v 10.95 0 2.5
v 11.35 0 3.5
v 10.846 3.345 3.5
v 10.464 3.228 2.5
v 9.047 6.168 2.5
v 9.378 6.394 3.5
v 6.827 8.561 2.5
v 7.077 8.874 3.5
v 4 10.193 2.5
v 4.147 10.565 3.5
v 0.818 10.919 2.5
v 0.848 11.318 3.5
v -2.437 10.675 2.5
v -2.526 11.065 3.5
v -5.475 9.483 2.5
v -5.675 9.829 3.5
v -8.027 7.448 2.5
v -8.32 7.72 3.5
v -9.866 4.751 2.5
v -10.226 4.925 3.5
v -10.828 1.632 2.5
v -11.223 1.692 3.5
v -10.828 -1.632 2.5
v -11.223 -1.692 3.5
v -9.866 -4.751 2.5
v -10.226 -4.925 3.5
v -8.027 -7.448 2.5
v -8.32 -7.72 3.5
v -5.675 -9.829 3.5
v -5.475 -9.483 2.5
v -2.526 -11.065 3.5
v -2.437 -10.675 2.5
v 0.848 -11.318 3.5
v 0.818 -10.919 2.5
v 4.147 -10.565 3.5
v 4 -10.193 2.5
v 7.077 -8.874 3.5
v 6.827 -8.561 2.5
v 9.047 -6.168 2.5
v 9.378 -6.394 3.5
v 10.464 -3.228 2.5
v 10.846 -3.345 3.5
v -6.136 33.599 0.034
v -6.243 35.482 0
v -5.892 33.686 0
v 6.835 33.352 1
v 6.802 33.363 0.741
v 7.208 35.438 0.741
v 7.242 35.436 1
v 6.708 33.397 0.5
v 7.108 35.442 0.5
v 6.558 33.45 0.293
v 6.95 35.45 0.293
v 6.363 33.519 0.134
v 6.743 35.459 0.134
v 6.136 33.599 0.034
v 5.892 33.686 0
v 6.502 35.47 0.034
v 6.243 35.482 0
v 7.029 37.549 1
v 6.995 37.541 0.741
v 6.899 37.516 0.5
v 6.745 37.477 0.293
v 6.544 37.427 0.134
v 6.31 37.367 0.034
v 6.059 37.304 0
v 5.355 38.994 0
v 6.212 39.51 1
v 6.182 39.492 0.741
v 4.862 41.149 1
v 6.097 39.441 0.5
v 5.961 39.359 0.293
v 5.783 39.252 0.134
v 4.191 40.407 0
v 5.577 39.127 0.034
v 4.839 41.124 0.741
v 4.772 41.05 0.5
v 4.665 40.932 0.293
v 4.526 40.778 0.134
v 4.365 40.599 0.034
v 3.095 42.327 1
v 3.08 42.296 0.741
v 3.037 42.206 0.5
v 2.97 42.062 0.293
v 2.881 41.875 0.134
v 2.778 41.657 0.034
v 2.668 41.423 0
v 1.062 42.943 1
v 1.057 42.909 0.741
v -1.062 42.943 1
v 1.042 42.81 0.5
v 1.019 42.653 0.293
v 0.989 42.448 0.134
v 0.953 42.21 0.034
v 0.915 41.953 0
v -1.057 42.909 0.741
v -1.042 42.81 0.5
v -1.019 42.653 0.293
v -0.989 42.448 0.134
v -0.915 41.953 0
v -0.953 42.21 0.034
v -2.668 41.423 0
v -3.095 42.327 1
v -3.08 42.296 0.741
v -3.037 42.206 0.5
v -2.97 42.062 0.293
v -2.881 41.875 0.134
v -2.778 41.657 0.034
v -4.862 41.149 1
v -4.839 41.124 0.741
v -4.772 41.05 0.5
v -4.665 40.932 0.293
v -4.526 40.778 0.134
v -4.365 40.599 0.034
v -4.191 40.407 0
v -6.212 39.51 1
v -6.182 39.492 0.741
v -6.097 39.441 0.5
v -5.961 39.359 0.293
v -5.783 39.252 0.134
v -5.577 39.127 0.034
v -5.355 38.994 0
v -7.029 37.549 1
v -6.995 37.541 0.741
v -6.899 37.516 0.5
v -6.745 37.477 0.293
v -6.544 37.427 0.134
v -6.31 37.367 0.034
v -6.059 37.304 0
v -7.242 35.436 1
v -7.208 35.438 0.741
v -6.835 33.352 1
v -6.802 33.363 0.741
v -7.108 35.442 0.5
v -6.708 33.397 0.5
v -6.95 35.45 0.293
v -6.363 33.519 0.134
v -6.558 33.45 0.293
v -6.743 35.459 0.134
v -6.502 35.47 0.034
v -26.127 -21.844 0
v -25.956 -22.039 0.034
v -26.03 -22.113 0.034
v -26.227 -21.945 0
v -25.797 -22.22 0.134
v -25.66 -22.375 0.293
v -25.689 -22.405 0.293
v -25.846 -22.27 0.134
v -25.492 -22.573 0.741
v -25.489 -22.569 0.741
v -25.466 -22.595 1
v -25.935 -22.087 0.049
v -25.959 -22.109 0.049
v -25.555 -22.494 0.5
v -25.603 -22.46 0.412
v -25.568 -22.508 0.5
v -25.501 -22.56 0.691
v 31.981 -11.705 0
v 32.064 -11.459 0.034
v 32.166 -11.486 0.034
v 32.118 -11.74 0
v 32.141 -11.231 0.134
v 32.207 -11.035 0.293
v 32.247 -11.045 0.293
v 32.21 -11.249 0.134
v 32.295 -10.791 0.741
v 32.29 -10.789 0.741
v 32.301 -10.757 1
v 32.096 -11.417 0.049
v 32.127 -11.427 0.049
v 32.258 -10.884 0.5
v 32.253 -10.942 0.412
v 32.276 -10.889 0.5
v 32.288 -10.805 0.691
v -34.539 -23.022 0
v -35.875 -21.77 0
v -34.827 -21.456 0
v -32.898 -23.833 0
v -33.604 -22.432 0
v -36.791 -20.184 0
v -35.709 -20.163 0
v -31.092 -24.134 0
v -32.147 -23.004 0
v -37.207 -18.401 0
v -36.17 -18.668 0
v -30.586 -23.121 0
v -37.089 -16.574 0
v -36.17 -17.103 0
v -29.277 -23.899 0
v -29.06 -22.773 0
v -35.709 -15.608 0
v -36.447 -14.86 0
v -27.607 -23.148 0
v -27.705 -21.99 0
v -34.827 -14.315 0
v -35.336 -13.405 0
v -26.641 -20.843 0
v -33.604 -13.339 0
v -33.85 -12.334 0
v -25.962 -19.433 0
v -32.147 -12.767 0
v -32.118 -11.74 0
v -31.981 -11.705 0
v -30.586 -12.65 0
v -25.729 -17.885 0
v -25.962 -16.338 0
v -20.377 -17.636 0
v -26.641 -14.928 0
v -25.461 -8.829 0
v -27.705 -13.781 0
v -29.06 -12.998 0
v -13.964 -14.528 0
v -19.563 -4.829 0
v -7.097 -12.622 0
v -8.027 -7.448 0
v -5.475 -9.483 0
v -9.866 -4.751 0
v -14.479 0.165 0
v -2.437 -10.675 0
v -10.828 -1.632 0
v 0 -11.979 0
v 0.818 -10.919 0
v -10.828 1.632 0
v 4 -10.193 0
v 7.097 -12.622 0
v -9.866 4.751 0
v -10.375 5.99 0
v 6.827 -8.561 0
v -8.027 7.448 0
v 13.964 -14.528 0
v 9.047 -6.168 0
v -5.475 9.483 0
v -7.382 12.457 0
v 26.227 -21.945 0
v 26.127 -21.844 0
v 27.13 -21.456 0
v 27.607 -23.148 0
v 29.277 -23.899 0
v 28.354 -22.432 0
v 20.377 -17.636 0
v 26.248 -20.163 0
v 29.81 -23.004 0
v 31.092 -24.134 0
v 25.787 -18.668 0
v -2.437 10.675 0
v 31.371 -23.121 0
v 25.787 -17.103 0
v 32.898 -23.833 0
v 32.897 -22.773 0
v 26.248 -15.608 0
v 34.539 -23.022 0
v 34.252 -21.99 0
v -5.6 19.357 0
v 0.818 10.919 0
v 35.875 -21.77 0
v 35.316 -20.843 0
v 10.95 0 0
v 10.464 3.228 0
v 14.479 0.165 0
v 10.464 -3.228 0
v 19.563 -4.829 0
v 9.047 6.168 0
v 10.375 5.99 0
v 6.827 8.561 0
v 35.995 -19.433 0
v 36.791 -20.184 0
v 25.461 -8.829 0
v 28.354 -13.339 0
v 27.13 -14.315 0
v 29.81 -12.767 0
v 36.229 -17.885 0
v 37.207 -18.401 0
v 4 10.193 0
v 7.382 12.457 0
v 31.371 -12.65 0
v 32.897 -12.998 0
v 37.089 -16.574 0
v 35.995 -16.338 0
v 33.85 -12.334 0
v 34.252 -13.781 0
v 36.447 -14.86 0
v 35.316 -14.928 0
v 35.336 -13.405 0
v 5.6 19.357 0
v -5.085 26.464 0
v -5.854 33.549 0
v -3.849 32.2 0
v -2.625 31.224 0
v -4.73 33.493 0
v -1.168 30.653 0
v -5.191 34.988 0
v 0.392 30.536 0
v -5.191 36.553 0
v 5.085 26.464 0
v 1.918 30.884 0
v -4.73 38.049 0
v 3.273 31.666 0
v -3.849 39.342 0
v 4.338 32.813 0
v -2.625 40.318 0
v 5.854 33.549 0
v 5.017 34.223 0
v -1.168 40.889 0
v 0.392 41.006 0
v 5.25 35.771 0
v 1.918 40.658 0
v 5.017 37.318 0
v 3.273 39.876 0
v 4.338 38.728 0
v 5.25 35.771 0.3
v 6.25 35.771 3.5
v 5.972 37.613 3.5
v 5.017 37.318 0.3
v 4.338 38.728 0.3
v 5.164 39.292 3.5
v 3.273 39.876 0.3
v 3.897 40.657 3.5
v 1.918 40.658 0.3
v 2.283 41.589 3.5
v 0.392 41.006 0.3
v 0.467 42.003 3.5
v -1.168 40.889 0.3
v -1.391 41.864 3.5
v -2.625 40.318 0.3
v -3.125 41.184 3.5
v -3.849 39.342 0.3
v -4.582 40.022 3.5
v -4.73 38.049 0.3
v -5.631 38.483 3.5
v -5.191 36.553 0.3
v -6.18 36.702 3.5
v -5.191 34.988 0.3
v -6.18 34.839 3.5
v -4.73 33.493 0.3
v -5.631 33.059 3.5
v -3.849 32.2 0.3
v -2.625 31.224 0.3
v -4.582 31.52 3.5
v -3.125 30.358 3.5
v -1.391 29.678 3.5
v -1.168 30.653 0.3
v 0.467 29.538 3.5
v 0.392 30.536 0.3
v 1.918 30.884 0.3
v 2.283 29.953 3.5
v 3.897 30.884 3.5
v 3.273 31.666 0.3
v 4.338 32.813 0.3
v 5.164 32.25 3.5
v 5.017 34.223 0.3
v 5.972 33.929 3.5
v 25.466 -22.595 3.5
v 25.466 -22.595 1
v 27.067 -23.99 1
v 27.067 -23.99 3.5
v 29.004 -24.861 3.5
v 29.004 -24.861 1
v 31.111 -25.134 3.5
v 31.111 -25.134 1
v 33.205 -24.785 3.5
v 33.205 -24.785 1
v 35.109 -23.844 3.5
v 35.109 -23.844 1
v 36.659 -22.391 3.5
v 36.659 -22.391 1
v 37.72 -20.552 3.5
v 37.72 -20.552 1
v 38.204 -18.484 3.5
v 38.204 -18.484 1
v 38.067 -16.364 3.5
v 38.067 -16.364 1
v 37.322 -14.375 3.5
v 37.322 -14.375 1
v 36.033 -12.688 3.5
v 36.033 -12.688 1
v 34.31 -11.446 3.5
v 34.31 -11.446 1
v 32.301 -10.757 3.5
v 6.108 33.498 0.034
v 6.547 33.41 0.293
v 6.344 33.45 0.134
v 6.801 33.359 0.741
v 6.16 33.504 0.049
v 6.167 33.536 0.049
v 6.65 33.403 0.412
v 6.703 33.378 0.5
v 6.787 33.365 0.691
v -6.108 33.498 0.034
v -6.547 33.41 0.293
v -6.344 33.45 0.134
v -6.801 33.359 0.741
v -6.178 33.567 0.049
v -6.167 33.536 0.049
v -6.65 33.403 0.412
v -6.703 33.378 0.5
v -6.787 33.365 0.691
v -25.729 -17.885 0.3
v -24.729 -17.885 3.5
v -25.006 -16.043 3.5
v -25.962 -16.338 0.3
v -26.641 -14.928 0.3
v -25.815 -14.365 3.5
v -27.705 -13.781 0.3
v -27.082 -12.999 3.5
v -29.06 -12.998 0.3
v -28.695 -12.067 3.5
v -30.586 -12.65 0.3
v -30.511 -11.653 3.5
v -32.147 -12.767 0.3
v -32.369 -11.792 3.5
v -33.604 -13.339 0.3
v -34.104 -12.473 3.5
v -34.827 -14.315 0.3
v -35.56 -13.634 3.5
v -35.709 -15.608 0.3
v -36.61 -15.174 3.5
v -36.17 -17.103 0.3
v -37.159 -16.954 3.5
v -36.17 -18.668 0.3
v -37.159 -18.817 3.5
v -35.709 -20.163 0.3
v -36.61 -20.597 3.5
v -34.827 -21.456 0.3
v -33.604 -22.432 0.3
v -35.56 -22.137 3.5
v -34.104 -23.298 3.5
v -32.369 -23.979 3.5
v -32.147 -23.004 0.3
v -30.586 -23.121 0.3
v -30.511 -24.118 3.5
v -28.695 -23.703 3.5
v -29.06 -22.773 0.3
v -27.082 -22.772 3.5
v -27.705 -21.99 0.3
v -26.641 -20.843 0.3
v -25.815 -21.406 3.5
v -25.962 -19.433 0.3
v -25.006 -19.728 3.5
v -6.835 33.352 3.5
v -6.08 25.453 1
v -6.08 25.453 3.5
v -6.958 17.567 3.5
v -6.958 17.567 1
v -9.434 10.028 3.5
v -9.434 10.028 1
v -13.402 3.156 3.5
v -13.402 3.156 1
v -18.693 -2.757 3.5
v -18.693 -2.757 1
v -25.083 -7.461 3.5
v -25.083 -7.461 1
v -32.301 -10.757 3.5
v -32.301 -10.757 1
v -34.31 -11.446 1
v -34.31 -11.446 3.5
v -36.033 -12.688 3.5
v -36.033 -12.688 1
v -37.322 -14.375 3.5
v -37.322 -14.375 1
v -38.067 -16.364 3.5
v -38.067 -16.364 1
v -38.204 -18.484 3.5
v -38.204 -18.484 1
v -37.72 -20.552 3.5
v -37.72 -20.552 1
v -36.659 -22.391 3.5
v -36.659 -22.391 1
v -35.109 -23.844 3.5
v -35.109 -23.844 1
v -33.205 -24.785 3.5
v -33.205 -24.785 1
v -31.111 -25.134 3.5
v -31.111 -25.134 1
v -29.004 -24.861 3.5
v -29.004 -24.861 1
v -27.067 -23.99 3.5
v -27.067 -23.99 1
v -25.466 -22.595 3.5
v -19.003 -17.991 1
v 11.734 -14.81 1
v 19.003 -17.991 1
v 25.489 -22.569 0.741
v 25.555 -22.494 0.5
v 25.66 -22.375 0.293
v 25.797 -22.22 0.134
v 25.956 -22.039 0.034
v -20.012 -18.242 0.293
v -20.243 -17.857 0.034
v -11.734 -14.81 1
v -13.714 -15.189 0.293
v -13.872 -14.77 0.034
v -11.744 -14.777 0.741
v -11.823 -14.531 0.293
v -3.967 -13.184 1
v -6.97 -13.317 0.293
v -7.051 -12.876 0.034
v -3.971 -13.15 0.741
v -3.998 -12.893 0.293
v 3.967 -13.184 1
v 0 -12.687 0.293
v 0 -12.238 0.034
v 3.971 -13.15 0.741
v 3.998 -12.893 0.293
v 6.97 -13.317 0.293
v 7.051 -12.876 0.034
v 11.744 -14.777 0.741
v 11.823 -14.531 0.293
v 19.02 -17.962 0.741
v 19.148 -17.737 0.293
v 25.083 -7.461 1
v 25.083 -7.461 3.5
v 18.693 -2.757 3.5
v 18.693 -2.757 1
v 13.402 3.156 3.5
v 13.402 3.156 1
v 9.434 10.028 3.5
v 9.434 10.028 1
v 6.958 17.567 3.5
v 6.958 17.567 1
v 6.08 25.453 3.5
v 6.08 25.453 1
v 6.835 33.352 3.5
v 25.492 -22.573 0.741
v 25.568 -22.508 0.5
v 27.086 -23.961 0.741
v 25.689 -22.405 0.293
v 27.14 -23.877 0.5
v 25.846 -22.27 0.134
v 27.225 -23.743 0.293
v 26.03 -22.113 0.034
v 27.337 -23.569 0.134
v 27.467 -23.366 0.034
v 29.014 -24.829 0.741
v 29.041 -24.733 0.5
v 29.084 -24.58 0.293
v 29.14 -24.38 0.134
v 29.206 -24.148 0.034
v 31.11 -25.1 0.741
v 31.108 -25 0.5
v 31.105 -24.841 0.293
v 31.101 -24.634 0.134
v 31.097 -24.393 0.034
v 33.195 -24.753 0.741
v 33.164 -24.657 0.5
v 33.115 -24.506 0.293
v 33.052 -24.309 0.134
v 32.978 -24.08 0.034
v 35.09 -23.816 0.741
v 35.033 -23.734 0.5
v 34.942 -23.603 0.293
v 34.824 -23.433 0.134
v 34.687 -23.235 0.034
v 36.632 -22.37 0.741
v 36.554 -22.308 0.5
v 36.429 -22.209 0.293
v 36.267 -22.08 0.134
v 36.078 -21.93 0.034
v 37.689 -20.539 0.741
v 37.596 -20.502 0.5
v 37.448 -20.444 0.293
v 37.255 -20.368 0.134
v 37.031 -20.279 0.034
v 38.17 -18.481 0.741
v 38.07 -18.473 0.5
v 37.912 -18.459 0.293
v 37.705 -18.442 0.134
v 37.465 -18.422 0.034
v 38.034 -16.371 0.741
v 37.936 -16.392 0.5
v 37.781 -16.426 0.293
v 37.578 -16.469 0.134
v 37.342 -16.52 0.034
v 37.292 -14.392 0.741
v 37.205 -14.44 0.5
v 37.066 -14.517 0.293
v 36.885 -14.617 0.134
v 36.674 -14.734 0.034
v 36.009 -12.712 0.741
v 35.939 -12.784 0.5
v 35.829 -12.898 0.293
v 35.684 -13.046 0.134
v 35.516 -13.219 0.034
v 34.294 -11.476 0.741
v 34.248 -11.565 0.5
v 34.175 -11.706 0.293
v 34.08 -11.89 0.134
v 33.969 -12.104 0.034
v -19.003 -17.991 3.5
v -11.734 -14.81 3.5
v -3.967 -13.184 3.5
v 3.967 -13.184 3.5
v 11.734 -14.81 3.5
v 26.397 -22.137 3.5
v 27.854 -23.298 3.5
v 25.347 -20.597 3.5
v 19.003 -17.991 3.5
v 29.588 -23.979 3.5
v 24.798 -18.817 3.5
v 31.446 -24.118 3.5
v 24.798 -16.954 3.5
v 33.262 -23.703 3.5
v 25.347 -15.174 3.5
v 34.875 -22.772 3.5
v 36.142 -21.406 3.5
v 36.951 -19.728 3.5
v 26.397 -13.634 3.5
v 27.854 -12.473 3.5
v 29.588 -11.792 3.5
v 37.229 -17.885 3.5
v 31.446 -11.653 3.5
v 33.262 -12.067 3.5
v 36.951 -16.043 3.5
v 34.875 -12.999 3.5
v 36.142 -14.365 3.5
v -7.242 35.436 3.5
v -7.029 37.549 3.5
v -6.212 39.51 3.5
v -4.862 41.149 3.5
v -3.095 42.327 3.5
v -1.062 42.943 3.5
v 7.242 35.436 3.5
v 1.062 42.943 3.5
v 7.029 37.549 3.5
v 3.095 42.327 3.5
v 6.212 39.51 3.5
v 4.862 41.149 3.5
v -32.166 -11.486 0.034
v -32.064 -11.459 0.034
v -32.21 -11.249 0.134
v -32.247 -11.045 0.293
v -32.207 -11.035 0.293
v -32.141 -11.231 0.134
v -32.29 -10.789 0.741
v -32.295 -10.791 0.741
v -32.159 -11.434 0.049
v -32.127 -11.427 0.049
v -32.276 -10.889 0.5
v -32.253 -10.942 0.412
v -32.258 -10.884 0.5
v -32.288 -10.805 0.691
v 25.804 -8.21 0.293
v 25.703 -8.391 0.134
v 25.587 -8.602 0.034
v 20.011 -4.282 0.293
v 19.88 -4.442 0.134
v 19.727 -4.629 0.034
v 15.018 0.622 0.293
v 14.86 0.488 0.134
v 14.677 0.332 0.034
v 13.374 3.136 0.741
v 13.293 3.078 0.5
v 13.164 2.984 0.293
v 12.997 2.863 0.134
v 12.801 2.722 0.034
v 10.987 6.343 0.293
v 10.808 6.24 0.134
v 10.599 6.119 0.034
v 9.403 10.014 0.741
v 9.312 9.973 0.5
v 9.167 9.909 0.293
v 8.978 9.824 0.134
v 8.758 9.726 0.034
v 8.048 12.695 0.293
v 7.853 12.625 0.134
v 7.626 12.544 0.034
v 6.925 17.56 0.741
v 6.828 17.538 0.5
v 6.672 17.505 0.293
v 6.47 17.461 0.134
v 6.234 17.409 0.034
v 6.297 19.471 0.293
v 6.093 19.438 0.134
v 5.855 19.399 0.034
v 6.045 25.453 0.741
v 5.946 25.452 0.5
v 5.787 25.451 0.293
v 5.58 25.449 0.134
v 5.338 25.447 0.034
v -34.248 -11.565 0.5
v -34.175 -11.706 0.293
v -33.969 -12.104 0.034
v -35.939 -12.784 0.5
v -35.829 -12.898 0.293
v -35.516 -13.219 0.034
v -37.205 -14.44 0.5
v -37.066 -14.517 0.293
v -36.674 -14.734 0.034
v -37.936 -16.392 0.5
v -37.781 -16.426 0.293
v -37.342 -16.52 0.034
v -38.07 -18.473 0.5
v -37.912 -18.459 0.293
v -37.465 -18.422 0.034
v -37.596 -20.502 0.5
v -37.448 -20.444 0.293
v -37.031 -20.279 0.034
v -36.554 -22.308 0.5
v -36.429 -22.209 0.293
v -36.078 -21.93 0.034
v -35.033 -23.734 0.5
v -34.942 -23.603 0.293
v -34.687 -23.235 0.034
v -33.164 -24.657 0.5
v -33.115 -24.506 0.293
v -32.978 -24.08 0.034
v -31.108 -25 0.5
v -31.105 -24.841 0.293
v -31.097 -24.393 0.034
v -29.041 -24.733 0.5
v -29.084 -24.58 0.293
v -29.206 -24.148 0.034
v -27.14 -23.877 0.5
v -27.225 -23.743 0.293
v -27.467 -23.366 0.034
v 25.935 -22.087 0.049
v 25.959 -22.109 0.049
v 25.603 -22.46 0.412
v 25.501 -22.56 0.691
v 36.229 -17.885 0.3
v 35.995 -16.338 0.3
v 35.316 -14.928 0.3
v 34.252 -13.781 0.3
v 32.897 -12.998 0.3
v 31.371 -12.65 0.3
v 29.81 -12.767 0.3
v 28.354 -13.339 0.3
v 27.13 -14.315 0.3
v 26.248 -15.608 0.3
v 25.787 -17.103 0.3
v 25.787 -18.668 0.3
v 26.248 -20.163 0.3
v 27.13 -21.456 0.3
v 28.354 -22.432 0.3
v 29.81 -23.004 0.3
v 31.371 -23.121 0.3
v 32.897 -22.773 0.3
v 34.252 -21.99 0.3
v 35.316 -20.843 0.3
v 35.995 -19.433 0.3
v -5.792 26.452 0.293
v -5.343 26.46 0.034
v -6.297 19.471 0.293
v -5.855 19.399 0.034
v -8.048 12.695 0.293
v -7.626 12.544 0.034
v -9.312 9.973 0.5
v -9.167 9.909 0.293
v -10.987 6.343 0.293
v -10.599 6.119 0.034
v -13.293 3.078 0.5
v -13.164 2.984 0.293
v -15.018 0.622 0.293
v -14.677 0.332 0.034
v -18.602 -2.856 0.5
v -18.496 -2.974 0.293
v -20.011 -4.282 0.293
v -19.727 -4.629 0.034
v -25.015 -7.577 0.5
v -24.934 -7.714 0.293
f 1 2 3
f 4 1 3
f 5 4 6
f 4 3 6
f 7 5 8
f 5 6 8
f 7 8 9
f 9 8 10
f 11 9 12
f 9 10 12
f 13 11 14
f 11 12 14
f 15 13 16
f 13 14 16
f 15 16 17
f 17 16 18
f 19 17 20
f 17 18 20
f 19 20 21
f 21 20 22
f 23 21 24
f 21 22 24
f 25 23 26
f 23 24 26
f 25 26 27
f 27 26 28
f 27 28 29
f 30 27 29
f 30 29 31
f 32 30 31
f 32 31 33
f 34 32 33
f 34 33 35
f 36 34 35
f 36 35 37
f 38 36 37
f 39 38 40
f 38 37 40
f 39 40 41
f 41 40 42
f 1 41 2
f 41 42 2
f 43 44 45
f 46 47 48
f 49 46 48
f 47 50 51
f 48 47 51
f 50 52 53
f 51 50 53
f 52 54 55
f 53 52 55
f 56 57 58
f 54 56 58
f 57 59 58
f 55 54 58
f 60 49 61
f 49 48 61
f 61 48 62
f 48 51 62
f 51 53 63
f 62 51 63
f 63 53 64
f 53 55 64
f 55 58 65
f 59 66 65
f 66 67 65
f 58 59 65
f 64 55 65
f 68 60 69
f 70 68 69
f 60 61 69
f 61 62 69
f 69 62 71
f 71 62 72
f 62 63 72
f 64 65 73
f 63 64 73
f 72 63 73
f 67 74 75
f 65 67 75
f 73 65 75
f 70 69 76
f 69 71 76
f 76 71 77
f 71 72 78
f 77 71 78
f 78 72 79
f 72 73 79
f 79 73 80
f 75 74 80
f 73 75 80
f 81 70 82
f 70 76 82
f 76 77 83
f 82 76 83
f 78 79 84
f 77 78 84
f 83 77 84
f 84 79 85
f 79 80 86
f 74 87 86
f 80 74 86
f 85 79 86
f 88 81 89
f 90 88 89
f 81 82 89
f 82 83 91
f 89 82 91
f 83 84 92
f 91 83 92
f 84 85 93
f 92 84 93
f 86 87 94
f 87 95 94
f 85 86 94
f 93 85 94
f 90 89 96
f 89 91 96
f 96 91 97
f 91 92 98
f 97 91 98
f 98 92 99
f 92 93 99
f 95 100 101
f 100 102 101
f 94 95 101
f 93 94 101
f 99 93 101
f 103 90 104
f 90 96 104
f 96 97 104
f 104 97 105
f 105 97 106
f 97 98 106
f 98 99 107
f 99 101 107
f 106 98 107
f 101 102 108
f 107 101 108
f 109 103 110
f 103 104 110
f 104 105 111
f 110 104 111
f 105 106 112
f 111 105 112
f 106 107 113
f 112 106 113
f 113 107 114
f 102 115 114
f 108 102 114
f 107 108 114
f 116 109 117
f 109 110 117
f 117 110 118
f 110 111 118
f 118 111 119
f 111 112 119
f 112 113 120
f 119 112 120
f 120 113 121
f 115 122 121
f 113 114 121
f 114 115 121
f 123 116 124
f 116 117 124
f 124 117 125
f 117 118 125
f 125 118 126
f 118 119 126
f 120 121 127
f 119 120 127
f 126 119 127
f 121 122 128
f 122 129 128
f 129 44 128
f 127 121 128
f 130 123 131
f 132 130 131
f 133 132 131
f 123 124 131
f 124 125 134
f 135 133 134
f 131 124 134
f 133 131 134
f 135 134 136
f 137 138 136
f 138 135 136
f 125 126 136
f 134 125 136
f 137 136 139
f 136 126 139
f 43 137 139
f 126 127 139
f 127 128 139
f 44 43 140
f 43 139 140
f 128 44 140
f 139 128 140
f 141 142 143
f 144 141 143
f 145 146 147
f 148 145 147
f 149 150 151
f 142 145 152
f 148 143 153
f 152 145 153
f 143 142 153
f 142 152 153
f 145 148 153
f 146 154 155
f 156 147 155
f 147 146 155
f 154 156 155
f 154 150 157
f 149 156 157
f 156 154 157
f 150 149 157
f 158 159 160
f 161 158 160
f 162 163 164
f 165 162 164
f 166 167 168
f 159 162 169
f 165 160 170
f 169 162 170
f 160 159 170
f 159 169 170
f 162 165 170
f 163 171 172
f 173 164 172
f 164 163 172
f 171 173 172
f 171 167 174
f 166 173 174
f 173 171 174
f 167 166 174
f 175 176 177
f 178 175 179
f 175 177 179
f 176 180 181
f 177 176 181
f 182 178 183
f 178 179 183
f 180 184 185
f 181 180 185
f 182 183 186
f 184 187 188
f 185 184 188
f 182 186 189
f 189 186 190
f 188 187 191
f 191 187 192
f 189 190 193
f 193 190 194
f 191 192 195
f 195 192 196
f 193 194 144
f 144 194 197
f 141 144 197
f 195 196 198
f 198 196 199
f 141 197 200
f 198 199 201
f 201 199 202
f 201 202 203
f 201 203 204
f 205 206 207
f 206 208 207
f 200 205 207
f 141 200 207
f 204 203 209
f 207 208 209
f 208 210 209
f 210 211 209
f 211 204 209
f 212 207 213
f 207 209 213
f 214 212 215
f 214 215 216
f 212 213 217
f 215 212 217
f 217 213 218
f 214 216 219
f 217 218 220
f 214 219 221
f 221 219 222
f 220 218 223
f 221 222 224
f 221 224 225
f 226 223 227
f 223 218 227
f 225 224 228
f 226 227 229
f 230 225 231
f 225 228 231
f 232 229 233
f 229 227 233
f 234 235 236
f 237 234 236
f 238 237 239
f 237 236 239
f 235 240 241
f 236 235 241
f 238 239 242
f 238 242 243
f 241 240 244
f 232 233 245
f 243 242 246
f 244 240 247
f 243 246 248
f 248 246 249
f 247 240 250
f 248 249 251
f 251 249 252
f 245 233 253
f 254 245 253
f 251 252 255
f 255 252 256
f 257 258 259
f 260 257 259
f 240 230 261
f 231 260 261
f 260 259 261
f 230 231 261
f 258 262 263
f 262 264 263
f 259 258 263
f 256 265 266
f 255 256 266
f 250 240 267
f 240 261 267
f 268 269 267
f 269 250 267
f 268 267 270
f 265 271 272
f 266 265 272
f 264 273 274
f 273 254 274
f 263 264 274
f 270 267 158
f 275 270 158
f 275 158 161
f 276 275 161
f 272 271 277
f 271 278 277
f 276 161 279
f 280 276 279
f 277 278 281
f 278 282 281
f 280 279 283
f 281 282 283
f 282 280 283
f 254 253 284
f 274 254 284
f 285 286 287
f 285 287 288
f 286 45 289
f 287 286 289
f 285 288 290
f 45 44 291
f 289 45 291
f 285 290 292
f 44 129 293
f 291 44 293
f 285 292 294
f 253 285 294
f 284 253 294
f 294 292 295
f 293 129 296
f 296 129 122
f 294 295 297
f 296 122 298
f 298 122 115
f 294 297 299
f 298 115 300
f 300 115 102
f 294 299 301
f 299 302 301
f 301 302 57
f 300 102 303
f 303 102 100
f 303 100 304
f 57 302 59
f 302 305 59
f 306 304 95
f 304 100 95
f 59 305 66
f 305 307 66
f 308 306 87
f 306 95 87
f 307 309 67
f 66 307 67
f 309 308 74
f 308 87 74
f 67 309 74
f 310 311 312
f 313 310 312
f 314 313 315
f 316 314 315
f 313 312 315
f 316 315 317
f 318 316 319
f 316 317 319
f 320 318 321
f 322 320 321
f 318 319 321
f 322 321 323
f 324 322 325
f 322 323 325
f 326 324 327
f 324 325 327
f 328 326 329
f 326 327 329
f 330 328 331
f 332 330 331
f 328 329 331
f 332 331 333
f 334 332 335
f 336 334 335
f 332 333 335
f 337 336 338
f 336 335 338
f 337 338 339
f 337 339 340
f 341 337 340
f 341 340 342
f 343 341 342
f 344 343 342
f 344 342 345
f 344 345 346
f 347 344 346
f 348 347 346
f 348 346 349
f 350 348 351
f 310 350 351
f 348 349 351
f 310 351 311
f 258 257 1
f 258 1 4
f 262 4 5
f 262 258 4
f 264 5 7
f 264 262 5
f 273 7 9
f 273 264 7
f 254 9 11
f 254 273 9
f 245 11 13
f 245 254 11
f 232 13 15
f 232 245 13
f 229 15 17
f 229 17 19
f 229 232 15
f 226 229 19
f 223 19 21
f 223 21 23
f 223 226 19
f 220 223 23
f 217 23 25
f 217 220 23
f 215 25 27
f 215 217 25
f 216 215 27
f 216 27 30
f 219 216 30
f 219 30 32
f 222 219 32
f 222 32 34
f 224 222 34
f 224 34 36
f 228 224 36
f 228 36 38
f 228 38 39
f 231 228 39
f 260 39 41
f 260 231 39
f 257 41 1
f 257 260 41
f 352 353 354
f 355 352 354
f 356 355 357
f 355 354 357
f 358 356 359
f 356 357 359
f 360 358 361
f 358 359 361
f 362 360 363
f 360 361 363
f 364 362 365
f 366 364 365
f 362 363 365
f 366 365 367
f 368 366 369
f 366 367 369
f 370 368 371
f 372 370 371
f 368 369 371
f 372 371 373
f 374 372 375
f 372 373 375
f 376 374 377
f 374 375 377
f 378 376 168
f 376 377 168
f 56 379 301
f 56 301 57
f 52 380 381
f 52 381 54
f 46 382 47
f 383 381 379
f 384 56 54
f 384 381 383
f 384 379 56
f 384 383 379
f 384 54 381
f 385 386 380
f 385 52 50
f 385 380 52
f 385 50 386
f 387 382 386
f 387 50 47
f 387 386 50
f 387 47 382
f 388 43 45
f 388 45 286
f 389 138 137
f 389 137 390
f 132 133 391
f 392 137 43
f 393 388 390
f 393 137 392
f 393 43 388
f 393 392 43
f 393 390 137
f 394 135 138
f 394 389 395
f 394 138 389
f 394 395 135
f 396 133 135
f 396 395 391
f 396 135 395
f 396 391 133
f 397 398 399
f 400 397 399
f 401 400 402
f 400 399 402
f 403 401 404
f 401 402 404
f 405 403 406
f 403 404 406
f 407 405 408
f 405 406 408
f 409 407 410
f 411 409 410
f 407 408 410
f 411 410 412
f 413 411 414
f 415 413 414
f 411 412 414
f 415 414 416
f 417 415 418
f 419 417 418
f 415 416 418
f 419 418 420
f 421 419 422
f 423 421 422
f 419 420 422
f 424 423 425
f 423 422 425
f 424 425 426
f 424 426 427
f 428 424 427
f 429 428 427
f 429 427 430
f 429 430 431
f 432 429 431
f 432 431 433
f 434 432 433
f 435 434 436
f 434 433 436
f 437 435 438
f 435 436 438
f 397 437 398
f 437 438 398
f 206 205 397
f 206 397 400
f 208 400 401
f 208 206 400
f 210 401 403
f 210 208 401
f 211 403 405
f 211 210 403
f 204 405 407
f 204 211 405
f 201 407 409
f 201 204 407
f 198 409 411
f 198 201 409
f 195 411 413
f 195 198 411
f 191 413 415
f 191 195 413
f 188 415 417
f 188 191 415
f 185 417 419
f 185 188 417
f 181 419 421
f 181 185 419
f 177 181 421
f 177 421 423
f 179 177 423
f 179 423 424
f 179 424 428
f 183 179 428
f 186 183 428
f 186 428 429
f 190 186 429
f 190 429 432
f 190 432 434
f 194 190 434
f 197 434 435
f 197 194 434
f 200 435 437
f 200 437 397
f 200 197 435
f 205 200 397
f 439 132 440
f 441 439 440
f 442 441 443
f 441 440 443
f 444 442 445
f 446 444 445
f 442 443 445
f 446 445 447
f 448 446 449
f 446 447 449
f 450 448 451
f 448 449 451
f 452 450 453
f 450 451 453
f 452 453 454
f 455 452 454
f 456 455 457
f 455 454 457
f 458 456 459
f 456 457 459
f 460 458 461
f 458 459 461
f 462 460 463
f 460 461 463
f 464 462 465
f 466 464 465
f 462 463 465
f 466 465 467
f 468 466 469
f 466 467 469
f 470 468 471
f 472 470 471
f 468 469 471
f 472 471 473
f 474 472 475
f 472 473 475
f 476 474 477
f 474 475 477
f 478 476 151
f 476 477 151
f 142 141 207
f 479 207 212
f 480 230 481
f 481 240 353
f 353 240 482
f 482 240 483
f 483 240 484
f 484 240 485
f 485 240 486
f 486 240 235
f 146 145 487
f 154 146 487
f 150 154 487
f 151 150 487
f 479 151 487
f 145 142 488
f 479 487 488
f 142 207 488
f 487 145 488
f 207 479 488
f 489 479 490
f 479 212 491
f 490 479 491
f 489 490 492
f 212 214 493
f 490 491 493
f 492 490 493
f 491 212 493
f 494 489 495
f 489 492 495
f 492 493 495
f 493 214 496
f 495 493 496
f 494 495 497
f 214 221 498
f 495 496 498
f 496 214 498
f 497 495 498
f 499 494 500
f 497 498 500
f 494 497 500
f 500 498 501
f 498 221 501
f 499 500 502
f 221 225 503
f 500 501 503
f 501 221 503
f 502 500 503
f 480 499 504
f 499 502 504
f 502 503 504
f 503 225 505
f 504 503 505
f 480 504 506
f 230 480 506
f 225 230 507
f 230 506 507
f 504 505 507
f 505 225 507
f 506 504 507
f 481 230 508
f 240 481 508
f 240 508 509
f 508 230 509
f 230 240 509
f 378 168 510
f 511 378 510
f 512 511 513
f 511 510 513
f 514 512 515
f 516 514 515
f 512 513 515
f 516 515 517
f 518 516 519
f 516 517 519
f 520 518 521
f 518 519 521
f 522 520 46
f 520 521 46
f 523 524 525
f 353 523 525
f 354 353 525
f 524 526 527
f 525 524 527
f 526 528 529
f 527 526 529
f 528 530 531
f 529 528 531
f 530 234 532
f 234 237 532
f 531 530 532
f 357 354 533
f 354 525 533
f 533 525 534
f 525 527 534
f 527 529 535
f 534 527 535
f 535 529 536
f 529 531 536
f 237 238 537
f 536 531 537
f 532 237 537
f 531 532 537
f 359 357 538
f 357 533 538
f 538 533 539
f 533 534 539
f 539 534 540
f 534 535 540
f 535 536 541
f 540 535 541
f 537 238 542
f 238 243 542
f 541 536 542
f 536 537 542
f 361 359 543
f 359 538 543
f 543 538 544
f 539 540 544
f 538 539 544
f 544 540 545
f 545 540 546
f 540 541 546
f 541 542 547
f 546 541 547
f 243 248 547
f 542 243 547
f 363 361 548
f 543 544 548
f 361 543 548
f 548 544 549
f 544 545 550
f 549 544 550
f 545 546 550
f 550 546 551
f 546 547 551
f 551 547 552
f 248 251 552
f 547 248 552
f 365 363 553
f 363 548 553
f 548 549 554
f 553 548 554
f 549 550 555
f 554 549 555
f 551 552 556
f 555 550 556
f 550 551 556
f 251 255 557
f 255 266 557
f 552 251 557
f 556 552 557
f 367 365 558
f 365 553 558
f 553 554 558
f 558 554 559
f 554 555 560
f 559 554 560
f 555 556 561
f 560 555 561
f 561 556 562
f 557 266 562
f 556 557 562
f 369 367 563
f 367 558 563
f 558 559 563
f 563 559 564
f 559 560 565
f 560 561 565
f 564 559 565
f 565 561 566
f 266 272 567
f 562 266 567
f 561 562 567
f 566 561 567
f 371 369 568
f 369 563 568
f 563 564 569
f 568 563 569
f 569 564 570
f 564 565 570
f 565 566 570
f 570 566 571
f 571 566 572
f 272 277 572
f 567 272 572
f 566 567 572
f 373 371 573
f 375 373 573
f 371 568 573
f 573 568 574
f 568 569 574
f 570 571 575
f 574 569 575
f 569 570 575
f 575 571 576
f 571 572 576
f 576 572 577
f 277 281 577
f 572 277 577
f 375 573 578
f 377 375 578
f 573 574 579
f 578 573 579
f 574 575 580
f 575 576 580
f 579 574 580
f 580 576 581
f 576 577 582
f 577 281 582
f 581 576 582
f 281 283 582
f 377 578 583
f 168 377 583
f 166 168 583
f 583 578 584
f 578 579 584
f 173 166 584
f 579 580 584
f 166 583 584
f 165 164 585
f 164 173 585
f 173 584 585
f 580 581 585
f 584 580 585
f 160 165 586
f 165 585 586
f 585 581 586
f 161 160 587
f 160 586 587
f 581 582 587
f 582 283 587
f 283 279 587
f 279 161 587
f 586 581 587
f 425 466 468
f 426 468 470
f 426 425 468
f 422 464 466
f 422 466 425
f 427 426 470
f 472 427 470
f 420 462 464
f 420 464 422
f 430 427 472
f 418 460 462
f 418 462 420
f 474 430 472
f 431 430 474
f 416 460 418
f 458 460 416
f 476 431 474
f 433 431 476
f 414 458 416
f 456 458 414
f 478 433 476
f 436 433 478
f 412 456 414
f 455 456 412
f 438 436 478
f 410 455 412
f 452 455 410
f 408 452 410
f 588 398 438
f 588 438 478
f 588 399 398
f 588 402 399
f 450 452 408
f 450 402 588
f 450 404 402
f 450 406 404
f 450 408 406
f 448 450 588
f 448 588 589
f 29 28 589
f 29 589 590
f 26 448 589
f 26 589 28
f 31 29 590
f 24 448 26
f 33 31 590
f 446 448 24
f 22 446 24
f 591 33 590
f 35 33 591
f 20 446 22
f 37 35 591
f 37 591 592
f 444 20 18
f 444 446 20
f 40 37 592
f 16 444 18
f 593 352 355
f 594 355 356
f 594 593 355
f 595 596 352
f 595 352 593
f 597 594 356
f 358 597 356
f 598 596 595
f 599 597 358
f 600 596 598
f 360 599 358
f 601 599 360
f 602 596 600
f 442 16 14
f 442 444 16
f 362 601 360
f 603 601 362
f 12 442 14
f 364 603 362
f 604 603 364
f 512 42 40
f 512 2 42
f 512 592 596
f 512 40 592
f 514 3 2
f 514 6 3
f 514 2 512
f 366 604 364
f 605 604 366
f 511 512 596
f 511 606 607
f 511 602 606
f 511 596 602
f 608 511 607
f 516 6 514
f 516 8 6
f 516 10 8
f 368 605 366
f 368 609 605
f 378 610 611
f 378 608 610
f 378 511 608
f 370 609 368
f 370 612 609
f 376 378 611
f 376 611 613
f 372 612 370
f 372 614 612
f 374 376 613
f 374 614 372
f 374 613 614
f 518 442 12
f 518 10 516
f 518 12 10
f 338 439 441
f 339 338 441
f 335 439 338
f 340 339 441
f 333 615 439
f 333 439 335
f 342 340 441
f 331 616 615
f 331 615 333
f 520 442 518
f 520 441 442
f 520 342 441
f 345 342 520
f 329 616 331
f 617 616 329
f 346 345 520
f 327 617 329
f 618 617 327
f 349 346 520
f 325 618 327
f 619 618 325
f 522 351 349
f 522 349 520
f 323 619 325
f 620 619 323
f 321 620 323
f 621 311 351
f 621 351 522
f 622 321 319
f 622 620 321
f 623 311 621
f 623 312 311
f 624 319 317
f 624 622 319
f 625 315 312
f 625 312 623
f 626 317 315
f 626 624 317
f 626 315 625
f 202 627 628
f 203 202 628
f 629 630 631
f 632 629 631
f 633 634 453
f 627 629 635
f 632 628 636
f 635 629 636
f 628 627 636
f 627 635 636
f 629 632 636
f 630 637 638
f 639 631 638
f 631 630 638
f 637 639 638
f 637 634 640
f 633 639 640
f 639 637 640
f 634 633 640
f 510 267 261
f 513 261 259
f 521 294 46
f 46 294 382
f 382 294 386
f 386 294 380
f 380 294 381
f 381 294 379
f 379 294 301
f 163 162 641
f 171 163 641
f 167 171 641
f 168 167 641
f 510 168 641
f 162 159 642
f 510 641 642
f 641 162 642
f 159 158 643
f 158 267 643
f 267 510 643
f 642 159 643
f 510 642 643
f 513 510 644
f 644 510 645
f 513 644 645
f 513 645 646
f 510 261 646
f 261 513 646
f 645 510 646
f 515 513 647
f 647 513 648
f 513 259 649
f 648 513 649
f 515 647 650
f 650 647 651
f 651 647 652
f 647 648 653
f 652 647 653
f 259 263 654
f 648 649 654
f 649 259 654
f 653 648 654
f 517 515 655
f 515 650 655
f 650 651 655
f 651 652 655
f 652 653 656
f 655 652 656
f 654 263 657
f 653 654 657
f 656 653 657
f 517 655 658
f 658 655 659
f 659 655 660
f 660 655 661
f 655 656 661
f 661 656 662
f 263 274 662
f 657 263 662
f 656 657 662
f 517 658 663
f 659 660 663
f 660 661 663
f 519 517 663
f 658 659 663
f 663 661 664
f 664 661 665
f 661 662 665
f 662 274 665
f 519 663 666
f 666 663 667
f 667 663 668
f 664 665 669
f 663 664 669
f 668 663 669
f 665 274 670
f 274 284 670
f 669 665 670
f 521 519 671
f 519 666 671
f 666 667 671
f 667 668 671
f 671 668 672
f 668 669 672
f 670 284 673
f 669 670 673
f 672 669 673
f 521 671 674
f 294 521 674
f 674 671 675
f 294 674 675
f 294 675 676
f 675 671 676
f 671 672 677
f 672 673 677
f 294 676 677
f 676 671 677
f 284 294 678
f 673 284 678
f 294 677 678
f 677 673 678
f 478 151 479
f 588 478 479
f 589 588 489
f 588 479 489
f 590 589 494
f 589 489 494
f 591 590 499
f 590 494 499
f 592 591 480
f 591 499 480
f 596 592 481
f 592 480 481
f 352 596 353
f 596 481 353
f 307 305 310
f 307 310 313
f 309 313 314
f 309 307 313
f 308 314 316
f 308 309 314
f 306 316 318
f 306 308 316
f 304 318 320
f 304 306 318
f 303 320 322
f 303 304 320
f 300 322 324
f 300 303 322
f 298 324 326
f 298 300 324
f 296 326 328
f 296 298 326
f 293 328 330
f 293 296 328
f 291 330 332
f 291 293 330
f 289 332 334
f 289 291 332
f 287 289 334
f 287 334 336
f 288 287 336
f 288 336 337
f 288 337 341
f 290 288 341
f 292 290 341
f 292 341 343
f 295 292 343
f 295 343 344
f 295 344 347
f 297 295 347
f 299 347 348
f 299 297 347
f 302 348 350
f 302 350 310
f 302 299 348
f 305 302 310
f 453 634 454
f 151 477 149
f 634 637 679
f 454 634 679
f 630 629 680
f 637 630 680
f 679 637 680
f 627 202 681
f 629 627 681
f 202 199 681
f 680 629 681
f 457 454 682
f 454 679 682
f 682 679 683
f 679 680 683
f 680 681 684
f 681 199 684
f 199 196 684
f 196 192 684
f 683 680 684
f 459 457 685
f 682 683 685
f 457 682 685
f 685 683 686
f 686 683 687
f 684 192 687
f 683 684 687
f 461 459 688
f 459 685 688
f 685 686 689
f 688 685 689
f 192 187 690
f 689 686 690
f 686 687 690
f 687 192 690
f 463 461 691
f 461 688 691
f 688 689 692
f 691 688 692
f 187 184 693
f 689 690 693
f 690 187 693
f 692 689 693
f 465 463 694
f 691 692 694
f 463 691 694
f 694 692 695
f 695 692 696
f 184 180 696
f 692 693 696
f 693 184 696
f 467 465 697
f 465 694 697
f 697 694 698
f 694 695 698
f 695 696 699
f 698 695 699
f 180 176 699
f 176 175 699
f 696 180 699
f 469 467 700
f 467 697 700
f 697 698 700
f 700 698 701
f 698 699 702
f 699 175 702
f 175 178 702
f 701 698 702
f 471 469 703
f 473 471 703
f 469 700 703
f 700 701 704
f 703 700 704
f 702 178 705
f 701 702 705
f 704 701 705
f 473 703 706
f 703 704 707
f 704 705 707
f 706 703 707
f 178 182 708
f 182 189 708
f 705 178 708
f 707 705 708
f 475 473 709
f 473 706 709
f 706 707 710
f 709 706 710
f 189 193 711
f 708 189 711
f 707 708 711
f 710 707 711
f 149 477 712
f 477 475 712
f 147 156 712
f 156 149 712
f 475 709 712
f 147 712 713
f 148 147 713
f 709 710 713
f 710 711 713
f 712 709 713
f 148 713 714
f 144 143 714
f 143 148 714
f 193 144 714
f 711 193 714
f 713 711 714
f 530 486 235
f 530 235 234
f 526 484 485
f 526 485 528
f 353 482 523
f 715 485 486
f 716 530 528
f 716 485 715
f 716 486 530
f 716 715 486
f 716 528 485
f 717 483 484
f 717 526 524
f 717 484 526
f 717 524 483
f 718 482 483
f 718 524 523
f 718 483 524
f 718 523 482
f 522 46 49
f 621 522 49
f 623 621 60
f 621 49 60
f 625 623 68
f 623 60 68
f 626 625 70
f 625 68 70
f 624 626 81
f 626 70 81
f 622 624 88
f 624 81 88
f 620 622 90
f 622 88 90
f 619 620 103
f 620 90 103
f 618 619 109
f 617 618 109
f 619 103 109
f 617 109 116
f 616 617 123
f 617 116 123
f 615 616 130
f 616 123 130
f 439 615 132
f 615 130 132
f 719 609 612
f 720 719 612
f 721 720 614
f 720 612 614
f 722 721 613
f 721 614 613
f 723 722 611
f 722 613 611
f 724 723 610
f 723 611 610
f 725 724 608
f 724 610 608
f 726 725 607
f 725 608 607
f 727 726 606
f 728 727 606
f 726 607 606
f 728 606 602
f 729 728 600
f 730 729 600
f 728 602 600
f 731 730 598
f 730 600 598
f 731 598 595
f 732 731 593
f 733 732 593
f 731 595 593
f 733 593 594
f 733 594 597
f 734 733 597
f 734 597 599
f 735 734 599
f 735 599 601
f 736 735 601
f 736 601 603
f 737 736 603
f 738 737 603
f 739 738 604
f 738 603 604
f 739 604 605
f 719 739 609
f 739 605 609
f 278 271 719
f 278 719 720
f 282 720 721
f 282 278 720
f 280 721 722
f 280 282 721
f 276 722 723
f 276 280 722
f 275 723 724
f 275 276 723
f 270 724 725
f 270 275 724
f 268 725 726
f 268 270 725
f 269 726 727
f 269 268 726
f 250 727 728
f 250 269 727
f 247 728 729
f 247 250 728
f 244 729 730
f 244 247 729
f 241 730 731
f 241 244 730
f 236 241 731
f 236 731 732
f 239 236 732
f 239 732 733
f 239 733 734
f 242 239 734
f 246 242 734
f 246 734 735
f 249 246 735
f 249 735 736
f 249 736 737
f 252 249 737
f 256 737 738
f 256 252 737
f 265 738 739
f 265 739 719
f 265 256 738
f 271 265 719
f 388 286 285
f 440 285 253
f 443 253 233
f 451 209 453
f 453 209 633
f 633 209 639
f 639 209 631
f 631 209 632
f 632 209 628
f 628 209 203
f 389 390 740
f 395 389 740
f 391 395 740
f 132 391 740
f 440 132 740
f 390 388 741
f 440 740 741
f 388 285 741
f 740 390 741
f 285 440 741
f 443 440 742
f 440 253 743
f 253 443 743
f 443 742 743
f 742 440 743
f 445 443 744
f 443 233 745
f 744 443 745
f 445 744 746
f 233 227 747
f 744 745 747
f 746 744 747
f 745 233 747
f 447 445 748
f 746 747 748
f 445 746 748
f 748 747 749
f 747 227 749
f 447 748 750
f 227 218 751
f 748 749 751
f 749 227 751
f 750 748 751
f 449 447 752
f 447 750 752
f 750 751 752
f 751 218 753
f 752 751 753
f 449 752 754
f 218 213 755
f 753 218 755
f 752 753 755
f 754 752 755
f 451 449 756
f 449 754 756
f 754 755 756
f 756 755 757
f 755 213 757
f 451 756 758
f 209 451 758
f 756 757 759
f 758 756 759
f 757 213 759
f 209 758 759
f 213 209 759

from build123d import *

# Parameters (mm, degrees)
F0_R       = 5.25
F0_R_2     = 10.95
F1_DEPTH   = 3.5
F2_SIZE2   = 0.4
F2_SIZE    = 1
F3_SIZE2   = 1
F3_SIZE    = 3.2
F3_2_SIZE2 = 1
F3_2_SIZE  = 3.2
F3_3_SIZE2 = 1
F3_3_SIZE  = 3.2
F4_R       = 1


with BuildPart() as f1:
    # F0 (on Top) → F1 (new body)
    with BuildSketch(Plane.XY):
        with BuildLine():
            ThreePointArc((32.3008352617, -10.7570571715), (11.2405764073, 6.4897498146), (6.8345328504, 33.3518724858))
            ThreePointArc((6.8345328504, 33.3518724858), (0, 43.0208930969), (-6.8345328504, 33.3518724858))
            ThreePointArc((-6.8345328504, 33.3518724858), (-11.2405764073, 6.4897498146), (-32.3008352617, -10.7570571715))
            ThreePointArc((-32.3008352617, -10.7570571715), (-37.2571863154, -21.5104465485), (-25.4663024113, -22.5948153143))
            ThreePointArc((-25.4663024113, -22.5948153143), (0, -12.9794996293), (25.4663024113, -22.5948153143))
            ThreePointArc((25.4663024113, -22.5948153143), (37.2571863154, -21.5104465485), (32.3008352617, -10.7570571715))
        make_face()
        with Locations((-30.978502138, -17.8854465485)):
            Circle(F0_R, mode=Mode.SUBTRACT)
        with Locations((30.978502138, -17.8854465485)):
            Circle(F0_R, mode=Mode.SUBTRACT)
        Circle(F0_R_2, mode=Mode.SUBTRACT)
        with Locations((0, 35.7708930969)):
            Circle(F0_R, mode=Mode.SUBTRACT)
    extrude(amount=F1_DEPTH)

    # F2
    f2_edges = [f1.edges().sort_by_distance(p)[0] for p in [
        (-10.95, 0, 3.5),
    ]]
    f2_side = f1.faces().sort_by_distance((-10.95, 0, 1.75))[0]
    chamfer(f2_edges, length=F2_SIZE, length2=F2_SIZE2, reference=f2_side)

    # F3
    f3_edges = [f1.edges().sort_by_distance(p)[0] for p in [
        (-5.25, 35.770893, 3.5),
    ]]
    f3_side = f1.faces().sort_by_distance((-5.25, 35.770893, 1.75))[0]
    chamfer(f3_edges, length=F3_SIZE, length2=F3_SIZE2, reference=f3_side)

    # F3#2
    f3_2_edges = [f1.edges().sort_by_distance(p)[0] for p in [
        (-36.228502, -17.885447, 3.5),
    ]]
    f3_2_side = f1.faces().sort_by_distance((-36.228502, -17.885447, 1.75))[0]
    chamfer(f3_2_edges, length=F3_2_SIZE, length2=F3_2_SIZE2, reference=f3_2_side)

    # F3#3
    f3_3_edges = [f1.edges().sort_by_distance(p)[0] for p in [
        (25.728502, -17.885447, 3.5),
    ]]
    f3_3_side = f1.faces().sort_by_distance((25.728502, -17.885447, 1.75))[0]
    chamfer(f3_3_edges, length=F3_3_SIZE, length2=F3_3_SIZE2, reference=f3_3_side)

    # F4
    f4_edges = [f1.edges().sort_by_distance(p)[0] for p in [
        (0, -12.9795, 0),
        (11.240576, 6.48975, 0),
        (37.257186, -21.510447, 0),
        (0, 43.020893, 0),
        (-37.257186, -21.510447, 0),
        (-11.240576, 6.48975, 0),
    ]]
    fillet(f4_edges, radius=F4_R)


solid = f1.part
